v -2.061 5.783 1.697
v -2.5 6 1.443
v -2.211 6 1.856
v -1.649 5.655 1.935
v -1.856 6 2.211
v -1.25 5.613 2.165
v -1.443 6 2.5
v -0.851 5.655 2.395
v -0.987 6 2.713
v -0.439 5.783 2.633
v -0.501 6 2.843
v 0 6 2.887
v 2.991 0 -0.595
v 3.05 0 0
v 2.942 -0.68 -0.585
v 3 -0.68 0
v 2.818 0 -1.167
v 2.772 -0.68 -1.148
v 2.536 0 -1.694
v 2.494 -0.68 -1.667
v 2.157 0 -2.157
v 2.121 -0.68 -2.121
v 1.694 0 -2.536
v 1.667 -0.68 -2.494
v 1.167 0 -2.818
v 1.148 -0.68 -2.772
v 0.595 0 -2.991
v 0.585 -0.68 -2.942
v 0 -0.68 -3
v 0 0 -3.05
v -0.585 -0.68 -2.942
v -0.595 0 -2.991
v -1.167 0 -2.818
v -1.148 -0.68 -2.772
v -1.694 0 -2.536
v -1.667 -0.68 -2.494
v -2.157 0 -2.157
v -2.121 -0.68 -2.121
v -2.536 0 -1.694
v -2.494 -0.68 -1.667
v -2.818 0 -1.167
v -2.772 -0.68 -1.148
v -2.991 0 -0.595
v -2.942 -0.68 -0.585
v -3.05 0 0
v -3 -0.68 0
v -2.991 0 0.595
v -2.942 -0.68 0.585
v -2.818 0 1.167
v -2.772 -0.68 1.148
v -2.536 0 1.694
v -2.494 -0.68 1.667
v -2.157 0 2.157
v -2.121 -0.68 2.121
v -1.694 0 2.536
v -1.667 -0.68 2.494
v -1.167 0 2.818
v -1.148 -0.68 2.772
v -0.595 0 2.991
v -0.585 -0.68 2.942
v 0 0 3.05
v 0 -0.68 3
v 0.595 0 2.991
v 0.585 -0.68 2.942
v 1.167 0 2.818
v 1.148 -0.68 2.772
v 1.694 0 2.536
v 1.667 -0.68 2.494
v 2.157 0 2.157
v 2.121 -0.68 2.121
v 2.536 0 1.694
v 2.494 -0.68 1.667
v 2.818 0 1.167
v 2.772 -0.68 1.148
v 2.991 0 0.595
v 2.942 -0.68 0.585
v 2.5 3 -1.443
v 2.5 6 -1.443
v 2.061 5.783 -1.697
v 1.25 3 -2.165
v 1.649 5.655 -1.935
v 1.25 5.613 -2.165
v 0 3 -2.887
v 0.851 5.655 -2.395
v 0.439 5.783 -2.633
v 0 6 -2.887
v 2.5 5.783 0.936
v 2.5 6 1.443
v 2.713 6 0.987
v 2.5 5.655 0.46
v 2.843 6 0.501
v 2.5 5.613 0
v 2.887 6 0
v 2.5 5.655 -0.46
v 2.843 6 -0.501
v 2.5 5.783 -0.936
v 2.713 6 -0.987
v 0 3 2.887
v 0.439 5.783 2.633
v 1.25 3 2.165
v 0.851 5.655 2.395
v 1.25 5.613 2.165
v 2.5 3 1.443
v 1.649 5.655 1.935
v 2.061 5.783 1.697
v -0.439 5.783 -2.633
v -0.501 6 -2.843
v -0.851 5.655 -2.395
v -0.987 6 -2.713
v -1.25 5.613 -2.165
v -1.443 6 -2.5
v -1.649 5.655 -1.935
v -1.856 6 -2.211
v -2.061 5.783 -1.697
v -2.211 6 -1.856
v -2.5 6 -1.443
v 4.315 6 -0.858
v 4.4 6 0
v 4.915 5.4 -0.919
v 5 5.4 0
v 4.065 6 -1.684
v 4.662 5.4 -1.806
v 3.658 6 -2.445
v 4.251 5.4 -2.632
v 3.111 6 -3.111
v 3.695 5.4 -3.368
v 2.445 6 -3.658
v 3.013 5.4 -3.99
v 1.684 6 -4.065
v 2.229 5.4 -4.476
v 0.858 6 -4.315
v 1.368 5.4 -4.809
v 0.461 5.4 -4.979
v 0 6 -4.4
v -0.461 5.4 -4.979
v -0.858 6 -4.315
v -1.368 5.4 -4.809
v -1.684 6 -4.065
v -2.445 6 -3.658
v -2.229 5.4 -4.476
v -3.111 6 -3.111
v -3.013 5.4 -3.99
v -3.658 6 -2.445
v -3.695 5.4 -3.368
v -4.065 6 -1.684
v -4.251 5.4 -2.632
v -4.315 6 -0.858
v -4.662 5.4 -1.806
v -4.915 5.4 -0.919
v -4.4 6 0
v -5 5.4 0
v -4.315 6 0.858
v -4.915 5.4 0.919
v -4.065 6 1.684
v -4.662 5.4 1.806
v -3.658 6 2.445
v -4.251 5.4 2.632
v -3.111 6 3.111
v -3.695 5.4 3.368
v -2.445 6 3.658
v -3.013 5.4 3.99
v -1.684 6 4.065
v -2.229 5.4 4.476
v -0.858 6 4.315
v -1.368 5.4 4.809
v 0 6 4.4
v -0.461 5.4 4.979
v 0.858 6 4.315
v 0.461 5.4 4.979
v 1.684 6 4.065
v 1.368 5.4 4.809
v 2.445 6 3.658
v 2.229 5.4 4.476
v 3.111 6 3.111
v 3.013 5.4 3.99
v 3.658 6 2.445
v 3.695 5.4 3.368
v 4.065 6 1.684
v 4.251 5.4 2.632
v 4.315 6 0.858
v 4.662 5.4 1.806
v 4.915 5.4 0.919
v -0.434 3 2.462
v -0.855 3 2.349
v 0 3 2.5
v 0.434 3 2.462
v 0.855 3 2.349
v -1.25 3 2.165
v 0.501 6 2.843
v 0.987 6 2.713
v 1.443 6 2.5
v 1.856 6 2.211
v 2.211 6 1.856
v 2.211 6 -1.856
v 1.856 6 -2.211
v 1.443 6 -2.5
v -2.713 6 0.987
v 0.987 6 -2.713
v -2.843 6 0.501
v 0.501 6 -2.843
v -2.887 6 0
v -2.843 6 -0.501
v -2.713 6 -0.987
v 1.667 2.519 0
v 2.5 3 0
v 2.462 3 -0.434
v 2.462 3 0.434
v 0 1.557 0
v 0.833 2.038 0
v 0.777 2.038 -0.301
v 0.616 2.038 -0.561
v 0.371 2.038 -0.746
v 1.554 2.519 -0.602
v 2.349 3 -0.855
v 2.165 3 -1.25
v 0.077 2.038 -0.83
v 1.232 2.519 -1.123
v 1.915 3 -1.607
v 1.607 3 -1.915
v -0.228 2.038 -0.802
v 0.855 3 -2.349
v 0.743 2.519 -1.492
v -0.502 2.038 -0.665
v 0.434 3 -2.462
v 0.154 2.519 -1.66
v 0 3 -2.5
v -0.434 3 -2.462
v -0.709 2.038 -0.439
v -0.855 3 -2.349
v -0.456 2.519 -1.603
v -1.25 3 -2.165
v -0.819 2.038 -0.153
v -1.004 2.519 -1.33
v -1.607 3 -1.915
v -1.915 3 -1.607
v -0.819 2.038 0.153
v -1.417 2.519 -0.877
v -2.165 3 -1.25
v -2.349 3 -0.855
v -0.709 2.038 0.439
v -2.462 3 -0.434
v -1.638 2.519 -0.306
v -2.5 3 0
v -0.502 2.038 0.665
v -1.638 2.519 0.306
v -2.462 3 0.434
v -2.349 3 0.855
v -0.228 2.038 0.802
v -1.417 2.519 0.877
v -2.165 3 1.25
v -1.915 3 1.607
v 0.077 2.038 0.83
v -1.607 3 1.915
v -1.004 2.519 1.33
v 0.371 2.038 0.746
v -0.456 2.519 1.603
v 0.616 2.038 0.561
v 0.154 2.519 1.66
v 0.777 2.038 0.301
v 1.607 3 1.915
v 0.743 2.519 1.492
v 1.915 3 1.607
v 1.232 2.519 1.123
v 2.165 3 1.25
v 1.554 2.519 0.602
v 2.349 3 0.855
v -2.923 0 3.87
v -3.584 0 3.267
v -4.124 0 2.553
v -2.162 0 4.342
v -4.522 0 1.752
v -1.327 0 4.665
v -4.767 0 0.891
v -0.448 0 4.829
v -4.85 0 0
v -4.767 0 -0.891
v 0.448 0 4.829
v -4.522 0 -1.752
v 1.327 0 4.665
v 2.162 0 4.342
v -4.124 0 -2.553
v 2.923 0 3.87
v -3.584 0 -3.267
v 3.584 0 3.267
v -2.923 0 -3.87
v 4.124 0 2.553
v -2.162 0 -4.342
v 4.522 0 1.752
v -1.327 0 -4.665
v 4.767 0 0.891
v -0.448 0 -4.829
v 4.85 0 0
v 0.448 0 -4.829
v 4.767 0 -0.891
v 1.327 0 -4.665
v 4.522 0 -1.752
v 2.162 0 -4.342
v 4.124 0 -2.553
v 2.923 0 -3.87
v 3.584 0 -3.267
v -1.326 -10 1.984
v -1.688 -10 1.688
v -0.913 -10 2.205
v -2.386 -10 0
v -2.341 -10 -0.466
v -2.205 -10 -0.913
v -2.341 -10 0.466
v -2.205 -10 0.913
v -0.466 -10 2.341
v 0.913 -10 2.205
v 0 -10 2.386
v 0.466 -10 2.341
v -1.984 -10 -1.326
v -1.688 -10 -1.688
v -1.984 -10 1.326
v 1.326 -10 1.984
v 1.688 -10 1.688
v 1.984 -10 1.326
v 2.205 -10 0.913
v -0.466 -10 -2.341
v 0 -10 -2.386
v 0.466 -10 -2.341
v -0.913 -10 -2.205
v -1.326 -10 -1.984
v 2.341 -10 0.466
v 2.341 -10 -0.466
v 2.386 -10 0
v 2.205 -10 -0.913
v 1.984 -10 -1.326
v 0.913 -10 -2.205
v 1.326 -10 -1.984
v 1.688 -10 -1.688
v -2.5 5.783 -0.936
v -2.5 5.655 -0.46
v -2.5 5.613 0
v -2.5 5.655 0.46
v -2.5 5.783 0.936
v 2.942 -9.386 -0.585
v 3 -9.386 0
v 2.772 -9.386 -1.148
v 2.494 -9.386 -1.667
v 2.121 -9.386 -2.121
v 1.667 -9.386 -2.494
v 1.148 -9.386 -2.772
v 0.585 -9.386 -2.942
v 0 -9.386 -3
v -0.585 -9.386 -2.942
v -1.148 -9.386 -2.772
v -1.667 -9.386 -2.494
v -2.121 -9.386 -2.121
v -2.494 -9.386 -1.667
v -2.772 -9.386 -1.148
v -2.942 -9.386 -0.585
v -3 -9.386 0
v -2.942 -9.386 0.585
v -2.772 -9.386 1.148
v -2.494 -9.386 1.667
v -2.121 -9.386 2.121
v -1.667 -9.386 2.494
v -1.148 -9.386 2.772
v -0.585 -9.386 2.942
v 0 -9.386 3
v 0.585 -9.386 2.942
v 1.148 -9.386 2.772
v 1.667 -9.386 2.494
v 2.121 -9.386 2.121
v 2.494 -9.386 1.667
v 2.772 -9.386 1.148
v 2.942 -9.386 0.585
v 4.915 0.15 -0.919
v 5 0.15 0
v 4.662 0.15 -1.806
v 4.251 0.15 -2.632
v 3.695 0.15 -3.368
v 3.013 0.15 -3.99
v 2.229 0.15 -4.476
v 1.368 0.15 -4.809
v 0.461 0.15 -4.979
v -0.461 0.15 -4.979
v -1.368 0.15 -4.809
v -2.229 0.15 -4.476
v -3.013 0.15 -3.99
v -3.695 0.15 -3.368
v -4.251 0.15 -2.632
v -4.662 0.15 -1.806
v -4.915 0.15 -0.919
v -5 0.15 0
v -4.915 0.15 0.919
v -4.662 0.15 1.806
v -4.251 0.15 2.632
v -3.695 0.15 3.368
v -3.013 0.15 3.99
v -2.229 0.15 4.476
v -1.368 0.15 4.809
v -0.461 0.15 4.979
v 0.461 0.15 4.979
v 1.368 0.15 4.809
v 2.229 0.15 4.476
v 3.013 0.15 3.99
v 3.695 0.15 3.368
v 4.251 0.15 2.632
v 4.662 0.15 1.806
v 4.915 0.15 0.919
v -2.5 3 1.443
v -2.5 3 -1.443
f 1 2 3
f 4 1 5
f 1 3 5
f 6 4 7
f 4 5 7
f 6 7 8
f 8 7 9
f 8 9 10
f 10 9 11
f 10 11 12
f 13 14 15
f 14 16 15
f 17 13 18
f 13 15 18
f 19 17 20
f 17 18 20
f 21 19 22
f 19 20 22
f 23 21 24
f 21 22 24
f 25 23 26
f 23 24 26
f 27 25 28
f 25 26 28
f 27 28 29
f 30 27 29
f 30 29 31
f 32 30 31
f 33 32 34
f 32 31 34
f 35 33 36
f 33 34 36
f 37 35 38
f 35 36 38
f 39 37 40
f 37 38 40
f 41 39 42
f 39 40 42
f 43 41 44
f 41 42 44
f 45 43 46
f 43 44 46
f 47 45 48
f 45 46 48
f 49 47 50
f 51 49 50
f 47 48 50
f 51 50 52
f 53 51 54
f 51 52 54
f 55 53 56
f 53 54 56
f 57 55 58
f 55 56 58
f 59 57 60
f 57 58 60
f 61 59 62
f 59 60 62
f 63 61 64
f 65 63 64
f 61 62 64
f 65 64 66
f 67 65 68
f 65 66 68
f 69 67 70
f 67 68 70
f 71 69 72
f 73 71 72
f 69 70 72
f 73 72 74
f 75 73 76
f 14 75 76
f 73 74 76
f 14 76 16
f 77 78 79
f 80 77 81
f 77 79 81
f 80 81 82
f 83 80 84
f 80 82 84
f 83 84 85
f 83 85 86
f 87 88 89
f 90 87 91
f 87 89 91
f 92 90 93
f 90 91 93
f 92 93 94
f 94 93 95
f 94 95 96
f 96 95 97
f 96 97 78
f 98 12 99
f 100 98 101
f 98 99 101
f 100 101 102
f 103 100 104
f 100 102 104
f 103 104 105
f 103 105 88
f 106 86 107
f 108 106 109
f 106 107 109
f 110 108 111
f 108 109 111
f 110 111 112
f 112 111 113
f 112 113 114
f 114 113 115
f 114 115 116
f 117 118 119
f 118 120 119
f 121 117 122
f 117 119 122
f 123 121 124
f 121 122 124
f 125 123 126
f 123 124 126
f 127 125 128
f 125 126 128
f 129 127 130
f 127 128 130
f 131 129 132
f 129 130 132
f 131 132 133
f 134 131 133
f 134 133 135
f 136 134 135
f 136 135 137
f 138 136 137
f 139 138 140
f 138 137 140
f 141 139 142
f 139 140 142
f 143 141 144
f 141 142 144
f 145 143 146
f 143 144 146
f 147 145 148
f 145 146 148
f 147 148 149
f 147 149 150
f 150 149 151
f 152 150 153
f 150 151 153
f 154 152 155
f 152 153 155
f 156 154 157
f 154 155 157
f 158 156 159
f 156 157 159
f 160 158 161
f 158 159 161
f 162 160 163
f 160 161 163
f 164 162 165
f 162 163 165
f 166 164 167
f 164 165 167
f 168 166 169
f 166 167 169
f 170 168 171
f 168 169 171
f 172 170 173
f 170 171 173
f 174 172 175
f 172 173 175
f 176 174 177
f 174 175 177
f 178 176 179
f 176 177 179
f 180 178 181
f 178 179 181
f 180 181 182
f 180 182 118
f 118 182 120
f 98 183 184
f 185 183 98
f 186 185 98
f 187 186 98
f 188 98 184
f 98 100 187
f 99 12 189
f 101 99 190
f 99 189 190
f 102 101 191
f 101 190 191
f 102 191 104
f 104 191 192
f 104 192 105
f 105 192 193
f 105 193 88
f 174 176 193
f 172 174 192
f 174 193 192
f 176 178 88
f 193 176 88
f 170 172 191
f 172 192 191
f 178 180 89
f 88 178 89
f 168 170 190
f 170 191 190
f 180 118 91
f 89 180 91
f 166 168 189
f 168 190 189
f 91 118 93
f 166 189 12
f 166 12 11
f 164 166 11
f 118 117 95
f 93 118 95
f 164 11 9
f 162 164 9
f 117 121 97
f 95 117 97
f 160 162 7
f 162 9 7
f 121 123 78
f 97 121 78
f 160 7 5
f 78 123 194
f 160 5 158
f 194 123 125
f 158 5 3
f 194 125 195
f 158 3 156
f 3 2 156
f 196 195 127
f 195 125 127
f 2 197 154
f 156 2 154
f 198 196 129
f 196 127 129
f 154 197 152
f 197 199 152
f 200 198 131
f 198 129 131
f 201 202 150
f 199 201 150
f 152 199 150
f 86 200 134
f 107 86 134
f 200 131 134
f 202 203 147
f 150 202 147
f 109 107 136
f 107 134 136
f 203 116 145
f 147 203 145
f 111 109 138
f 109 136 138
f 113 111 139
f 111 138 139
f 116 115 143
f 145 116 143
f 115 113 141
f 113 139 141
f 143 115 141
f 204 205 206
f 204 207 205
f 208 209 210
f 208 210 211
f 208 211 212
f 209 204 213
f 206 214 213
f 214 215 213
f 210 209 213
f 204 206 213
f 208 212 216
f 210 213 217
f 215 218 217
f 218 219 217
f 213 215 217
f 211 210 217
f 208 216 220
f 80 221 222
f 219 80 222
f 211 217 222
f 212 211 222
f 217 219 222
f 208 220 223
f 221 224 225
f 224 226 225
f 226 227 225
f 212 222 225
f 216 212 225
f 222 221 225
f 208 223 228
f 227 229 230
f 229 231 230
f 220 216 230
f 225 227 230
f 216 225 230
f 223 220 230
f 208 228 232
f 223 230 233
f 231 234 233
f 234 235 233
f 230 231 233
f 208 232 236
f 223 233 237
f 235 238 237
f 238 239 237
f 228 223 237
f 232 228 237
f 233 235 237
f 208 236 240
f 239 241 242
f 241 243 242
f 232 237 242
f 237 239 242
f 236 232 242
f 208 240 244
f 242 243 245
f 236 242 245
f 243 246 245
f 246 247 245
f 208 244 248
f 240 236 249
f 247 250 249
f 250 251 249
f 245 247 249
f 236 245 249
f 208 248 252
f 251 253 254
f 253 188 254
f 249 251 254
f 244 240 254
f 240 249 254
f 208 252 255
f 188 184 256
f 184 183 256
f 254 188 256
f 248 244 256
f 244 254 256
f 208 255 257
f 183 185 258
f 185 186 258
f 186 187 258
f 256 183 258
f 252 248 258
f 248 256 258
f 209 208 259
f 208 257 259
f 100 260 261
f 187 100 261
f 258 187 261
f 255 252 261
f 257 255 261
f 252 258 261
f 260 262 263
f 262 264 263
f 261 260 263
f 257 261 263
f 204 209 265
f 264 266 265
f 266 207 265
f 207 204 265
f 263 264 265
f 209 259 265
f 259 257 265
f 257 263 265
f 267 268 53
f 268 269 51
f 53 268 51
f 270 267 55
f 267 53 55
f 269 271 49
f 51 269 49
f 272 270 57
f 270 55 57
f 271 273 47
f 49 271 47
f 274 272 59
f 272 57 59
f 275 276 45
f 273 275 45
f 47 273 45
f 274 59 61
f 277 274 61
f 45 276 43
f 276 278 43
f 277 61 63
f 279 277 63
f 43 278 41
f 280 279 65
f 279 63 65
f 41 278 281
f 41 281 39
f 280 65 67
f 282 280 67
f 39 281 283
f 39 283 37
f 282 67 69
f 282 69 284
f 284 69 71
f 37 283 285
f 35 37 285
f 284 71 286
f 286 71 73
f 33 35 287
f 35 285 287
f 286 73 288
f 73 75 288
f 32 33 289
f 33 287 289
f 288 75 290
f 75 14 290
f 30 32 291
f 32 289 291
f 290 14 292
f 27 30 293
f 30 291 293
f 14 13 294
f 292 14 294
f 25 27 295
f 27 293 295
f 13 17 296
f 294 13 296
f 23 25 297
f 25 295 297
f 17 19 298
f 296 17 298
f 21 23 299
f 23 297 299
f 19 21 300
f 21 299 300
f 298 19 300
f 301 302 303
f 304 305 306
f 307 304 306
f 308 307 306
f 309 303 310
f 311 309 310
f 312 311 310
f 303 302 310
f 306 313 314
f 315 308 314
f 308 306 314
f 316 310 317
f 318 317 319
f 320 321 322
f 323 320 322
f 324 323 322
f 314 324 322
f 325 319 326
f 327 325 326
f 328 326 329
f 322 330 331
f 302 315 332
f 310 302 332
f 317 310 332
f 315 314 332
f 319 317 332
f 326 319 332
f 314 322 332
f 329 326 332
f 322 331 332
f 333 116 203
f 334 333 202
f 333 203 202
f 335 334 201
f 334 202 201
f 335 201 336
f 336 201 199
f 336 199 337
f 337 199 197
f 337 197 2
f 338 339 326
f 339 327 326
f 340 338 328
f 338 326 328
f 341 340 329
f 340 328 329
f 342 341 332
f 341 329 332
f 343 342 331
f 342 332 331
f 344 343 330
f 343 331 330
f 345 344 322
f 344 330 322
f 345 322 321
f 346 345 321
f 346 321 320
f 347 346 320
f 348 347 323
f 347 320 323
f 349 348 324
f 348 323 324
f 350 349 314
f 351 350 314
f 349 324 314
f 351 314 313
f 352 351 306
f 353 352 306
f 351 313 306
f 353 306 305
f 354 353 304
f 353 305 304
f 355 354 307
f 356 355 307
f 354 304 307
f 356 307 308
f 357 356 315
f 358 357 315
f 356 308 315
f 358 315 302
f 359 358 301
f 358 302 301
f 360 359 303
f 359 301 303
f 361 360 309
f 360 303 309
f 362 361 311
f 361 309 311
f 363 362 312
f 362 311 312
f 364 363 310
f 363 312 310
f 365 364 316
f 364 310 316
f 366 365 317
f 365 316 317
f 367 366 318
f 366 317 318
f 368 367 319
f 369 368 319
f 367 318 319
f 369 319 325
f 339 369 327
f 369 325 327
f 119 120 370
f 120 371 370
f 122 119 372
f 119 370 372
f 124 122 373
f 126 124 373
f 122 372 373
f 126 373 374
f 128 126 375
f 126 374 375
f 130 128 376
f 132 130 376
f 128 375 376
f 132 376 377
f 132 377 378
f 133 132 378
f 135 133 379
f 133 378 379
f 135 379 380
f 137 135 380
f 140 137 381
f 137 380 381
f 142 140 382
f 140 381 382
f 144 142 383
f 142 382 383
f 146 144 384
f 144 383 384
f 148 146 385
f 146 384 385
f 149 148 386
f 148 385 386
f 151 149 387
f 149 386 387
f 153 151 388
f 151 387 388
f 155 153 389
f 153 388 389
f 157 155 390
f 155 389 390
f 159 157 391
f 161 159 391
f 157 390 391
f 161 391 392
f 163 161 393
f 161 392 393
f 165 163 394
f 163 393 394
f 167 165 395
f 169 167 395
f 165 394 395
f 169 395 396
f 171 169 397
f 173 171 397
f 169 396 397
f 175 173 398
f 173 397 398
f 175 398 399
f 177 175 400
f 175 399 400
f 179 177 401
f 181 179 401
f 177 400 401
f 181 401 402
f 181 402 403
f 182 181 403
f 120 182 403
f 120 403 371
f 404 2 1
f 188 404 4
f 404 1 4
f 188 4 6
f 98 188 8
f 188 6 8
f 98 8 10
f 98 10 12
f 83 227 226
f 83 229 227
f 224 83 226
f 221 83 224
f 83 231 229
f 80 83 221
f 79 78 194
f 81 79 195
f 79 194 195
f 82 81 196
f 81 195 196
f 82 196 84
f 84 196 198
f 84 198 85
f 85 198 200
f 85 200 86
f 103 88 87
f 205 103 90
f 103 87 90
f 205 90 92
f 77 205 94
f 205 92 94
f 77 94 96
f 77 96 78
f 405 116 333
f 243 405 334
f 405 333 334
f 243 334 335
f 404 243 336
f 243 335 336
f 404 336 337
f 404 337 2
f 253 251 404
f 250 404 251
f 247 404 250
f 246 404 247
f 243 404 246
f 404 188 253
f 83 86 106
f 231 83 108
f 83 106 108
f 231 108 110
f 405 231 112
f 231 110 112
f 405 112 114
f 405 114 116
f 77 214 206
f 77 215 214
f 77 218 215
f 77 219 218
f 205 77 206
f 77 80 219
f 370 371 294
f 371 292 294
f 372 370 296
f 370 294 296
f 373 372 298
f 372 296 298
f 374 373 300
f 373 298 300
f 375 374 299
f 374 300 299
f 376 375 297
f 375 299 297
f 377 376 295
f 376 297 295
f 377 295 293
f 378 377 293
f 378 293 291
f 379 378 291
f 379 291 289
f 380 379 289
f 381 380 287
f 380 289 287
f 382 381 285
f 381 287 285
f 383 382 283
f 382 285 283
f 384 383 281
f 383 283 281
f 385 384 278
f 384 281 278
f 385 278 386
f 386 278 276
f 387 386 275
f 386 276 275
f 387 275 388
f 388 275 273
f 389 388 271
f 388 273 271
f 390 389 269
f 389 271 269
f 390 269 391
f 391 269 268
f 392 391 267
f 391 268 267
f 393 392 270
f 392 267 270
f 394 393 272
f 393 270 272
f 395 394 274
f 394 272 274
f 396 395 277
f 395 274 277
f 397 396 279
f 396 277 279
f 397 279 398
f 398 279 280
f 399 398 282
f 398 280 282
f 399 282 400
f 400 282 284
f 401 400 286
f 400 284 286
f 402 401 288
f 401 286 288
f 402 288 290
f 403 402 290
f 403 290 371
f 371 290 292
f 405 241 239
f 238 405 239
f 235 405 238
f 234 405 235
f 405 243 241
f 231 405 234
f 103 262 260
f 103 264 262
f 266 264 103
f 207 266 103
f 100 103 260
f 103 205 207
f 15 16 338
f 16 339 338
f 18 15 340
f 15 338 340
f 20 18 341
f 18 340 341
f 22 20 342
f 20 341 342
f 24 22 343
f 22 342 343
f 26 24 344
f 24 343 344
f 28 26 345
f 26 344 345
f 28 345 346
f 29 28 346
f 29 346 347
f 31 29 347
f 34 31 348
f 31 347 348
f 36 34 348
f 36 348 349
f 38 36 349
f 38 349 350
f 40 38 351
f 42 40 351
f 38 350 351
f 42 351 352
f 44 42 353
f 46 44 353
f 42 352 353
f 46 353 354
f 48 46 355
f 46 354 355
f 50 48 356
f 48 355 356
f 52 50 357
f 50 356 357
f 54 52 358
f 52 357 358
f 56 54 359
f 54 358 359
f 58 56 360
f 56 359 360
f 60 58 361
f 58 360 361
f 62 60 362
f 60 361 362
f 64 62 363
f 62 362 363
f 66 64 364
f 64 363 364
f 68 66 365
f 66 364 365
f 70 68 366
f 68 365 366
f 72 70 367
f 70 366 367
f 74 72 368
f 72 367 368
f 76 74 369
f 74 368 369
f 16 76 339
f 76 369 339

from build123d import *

# Parameters (mm, degrees)
CUT_EXTRUDE1_DEPTH = 3


with BuildPart() as part:
    # Sketch1 → Revolve1 (revolve)
    with BuildSketch(Plane.XY):
        Polygon((0, 1.556624327), (2.5, 3), (2.5, 5.613248654), (2.886751346, 6), (4.4, 6), (5, 5.4), (5, 0.15), (4.85, 0), (3.05, 0), (3, -0.68), (3, -9.3865), (2.3865, -10), (0, -10), align=None)
    revolve(axis=Axis((0, -10, 0), (0, 1, 0)))

    # Sketch2 → Cut-Extrude1 (cut)
    with BuildSketch(Plane(origin=(0, 6, 0), x_dir=(1, 0, 0), z_dir=(0, 1, 0))):
        Polygon((-2.5, -1.443375673), (0, -2.886751346), (2.5, -1.443375673), (2.5, 1.443375673), (0, 2.886751346), (-2.5, 1.443375673), align=None)
    extrude(amount=-CUT_EXTRUDE1_DEPTH, mode=Mode.SUBTRACT)


solid = part.part
